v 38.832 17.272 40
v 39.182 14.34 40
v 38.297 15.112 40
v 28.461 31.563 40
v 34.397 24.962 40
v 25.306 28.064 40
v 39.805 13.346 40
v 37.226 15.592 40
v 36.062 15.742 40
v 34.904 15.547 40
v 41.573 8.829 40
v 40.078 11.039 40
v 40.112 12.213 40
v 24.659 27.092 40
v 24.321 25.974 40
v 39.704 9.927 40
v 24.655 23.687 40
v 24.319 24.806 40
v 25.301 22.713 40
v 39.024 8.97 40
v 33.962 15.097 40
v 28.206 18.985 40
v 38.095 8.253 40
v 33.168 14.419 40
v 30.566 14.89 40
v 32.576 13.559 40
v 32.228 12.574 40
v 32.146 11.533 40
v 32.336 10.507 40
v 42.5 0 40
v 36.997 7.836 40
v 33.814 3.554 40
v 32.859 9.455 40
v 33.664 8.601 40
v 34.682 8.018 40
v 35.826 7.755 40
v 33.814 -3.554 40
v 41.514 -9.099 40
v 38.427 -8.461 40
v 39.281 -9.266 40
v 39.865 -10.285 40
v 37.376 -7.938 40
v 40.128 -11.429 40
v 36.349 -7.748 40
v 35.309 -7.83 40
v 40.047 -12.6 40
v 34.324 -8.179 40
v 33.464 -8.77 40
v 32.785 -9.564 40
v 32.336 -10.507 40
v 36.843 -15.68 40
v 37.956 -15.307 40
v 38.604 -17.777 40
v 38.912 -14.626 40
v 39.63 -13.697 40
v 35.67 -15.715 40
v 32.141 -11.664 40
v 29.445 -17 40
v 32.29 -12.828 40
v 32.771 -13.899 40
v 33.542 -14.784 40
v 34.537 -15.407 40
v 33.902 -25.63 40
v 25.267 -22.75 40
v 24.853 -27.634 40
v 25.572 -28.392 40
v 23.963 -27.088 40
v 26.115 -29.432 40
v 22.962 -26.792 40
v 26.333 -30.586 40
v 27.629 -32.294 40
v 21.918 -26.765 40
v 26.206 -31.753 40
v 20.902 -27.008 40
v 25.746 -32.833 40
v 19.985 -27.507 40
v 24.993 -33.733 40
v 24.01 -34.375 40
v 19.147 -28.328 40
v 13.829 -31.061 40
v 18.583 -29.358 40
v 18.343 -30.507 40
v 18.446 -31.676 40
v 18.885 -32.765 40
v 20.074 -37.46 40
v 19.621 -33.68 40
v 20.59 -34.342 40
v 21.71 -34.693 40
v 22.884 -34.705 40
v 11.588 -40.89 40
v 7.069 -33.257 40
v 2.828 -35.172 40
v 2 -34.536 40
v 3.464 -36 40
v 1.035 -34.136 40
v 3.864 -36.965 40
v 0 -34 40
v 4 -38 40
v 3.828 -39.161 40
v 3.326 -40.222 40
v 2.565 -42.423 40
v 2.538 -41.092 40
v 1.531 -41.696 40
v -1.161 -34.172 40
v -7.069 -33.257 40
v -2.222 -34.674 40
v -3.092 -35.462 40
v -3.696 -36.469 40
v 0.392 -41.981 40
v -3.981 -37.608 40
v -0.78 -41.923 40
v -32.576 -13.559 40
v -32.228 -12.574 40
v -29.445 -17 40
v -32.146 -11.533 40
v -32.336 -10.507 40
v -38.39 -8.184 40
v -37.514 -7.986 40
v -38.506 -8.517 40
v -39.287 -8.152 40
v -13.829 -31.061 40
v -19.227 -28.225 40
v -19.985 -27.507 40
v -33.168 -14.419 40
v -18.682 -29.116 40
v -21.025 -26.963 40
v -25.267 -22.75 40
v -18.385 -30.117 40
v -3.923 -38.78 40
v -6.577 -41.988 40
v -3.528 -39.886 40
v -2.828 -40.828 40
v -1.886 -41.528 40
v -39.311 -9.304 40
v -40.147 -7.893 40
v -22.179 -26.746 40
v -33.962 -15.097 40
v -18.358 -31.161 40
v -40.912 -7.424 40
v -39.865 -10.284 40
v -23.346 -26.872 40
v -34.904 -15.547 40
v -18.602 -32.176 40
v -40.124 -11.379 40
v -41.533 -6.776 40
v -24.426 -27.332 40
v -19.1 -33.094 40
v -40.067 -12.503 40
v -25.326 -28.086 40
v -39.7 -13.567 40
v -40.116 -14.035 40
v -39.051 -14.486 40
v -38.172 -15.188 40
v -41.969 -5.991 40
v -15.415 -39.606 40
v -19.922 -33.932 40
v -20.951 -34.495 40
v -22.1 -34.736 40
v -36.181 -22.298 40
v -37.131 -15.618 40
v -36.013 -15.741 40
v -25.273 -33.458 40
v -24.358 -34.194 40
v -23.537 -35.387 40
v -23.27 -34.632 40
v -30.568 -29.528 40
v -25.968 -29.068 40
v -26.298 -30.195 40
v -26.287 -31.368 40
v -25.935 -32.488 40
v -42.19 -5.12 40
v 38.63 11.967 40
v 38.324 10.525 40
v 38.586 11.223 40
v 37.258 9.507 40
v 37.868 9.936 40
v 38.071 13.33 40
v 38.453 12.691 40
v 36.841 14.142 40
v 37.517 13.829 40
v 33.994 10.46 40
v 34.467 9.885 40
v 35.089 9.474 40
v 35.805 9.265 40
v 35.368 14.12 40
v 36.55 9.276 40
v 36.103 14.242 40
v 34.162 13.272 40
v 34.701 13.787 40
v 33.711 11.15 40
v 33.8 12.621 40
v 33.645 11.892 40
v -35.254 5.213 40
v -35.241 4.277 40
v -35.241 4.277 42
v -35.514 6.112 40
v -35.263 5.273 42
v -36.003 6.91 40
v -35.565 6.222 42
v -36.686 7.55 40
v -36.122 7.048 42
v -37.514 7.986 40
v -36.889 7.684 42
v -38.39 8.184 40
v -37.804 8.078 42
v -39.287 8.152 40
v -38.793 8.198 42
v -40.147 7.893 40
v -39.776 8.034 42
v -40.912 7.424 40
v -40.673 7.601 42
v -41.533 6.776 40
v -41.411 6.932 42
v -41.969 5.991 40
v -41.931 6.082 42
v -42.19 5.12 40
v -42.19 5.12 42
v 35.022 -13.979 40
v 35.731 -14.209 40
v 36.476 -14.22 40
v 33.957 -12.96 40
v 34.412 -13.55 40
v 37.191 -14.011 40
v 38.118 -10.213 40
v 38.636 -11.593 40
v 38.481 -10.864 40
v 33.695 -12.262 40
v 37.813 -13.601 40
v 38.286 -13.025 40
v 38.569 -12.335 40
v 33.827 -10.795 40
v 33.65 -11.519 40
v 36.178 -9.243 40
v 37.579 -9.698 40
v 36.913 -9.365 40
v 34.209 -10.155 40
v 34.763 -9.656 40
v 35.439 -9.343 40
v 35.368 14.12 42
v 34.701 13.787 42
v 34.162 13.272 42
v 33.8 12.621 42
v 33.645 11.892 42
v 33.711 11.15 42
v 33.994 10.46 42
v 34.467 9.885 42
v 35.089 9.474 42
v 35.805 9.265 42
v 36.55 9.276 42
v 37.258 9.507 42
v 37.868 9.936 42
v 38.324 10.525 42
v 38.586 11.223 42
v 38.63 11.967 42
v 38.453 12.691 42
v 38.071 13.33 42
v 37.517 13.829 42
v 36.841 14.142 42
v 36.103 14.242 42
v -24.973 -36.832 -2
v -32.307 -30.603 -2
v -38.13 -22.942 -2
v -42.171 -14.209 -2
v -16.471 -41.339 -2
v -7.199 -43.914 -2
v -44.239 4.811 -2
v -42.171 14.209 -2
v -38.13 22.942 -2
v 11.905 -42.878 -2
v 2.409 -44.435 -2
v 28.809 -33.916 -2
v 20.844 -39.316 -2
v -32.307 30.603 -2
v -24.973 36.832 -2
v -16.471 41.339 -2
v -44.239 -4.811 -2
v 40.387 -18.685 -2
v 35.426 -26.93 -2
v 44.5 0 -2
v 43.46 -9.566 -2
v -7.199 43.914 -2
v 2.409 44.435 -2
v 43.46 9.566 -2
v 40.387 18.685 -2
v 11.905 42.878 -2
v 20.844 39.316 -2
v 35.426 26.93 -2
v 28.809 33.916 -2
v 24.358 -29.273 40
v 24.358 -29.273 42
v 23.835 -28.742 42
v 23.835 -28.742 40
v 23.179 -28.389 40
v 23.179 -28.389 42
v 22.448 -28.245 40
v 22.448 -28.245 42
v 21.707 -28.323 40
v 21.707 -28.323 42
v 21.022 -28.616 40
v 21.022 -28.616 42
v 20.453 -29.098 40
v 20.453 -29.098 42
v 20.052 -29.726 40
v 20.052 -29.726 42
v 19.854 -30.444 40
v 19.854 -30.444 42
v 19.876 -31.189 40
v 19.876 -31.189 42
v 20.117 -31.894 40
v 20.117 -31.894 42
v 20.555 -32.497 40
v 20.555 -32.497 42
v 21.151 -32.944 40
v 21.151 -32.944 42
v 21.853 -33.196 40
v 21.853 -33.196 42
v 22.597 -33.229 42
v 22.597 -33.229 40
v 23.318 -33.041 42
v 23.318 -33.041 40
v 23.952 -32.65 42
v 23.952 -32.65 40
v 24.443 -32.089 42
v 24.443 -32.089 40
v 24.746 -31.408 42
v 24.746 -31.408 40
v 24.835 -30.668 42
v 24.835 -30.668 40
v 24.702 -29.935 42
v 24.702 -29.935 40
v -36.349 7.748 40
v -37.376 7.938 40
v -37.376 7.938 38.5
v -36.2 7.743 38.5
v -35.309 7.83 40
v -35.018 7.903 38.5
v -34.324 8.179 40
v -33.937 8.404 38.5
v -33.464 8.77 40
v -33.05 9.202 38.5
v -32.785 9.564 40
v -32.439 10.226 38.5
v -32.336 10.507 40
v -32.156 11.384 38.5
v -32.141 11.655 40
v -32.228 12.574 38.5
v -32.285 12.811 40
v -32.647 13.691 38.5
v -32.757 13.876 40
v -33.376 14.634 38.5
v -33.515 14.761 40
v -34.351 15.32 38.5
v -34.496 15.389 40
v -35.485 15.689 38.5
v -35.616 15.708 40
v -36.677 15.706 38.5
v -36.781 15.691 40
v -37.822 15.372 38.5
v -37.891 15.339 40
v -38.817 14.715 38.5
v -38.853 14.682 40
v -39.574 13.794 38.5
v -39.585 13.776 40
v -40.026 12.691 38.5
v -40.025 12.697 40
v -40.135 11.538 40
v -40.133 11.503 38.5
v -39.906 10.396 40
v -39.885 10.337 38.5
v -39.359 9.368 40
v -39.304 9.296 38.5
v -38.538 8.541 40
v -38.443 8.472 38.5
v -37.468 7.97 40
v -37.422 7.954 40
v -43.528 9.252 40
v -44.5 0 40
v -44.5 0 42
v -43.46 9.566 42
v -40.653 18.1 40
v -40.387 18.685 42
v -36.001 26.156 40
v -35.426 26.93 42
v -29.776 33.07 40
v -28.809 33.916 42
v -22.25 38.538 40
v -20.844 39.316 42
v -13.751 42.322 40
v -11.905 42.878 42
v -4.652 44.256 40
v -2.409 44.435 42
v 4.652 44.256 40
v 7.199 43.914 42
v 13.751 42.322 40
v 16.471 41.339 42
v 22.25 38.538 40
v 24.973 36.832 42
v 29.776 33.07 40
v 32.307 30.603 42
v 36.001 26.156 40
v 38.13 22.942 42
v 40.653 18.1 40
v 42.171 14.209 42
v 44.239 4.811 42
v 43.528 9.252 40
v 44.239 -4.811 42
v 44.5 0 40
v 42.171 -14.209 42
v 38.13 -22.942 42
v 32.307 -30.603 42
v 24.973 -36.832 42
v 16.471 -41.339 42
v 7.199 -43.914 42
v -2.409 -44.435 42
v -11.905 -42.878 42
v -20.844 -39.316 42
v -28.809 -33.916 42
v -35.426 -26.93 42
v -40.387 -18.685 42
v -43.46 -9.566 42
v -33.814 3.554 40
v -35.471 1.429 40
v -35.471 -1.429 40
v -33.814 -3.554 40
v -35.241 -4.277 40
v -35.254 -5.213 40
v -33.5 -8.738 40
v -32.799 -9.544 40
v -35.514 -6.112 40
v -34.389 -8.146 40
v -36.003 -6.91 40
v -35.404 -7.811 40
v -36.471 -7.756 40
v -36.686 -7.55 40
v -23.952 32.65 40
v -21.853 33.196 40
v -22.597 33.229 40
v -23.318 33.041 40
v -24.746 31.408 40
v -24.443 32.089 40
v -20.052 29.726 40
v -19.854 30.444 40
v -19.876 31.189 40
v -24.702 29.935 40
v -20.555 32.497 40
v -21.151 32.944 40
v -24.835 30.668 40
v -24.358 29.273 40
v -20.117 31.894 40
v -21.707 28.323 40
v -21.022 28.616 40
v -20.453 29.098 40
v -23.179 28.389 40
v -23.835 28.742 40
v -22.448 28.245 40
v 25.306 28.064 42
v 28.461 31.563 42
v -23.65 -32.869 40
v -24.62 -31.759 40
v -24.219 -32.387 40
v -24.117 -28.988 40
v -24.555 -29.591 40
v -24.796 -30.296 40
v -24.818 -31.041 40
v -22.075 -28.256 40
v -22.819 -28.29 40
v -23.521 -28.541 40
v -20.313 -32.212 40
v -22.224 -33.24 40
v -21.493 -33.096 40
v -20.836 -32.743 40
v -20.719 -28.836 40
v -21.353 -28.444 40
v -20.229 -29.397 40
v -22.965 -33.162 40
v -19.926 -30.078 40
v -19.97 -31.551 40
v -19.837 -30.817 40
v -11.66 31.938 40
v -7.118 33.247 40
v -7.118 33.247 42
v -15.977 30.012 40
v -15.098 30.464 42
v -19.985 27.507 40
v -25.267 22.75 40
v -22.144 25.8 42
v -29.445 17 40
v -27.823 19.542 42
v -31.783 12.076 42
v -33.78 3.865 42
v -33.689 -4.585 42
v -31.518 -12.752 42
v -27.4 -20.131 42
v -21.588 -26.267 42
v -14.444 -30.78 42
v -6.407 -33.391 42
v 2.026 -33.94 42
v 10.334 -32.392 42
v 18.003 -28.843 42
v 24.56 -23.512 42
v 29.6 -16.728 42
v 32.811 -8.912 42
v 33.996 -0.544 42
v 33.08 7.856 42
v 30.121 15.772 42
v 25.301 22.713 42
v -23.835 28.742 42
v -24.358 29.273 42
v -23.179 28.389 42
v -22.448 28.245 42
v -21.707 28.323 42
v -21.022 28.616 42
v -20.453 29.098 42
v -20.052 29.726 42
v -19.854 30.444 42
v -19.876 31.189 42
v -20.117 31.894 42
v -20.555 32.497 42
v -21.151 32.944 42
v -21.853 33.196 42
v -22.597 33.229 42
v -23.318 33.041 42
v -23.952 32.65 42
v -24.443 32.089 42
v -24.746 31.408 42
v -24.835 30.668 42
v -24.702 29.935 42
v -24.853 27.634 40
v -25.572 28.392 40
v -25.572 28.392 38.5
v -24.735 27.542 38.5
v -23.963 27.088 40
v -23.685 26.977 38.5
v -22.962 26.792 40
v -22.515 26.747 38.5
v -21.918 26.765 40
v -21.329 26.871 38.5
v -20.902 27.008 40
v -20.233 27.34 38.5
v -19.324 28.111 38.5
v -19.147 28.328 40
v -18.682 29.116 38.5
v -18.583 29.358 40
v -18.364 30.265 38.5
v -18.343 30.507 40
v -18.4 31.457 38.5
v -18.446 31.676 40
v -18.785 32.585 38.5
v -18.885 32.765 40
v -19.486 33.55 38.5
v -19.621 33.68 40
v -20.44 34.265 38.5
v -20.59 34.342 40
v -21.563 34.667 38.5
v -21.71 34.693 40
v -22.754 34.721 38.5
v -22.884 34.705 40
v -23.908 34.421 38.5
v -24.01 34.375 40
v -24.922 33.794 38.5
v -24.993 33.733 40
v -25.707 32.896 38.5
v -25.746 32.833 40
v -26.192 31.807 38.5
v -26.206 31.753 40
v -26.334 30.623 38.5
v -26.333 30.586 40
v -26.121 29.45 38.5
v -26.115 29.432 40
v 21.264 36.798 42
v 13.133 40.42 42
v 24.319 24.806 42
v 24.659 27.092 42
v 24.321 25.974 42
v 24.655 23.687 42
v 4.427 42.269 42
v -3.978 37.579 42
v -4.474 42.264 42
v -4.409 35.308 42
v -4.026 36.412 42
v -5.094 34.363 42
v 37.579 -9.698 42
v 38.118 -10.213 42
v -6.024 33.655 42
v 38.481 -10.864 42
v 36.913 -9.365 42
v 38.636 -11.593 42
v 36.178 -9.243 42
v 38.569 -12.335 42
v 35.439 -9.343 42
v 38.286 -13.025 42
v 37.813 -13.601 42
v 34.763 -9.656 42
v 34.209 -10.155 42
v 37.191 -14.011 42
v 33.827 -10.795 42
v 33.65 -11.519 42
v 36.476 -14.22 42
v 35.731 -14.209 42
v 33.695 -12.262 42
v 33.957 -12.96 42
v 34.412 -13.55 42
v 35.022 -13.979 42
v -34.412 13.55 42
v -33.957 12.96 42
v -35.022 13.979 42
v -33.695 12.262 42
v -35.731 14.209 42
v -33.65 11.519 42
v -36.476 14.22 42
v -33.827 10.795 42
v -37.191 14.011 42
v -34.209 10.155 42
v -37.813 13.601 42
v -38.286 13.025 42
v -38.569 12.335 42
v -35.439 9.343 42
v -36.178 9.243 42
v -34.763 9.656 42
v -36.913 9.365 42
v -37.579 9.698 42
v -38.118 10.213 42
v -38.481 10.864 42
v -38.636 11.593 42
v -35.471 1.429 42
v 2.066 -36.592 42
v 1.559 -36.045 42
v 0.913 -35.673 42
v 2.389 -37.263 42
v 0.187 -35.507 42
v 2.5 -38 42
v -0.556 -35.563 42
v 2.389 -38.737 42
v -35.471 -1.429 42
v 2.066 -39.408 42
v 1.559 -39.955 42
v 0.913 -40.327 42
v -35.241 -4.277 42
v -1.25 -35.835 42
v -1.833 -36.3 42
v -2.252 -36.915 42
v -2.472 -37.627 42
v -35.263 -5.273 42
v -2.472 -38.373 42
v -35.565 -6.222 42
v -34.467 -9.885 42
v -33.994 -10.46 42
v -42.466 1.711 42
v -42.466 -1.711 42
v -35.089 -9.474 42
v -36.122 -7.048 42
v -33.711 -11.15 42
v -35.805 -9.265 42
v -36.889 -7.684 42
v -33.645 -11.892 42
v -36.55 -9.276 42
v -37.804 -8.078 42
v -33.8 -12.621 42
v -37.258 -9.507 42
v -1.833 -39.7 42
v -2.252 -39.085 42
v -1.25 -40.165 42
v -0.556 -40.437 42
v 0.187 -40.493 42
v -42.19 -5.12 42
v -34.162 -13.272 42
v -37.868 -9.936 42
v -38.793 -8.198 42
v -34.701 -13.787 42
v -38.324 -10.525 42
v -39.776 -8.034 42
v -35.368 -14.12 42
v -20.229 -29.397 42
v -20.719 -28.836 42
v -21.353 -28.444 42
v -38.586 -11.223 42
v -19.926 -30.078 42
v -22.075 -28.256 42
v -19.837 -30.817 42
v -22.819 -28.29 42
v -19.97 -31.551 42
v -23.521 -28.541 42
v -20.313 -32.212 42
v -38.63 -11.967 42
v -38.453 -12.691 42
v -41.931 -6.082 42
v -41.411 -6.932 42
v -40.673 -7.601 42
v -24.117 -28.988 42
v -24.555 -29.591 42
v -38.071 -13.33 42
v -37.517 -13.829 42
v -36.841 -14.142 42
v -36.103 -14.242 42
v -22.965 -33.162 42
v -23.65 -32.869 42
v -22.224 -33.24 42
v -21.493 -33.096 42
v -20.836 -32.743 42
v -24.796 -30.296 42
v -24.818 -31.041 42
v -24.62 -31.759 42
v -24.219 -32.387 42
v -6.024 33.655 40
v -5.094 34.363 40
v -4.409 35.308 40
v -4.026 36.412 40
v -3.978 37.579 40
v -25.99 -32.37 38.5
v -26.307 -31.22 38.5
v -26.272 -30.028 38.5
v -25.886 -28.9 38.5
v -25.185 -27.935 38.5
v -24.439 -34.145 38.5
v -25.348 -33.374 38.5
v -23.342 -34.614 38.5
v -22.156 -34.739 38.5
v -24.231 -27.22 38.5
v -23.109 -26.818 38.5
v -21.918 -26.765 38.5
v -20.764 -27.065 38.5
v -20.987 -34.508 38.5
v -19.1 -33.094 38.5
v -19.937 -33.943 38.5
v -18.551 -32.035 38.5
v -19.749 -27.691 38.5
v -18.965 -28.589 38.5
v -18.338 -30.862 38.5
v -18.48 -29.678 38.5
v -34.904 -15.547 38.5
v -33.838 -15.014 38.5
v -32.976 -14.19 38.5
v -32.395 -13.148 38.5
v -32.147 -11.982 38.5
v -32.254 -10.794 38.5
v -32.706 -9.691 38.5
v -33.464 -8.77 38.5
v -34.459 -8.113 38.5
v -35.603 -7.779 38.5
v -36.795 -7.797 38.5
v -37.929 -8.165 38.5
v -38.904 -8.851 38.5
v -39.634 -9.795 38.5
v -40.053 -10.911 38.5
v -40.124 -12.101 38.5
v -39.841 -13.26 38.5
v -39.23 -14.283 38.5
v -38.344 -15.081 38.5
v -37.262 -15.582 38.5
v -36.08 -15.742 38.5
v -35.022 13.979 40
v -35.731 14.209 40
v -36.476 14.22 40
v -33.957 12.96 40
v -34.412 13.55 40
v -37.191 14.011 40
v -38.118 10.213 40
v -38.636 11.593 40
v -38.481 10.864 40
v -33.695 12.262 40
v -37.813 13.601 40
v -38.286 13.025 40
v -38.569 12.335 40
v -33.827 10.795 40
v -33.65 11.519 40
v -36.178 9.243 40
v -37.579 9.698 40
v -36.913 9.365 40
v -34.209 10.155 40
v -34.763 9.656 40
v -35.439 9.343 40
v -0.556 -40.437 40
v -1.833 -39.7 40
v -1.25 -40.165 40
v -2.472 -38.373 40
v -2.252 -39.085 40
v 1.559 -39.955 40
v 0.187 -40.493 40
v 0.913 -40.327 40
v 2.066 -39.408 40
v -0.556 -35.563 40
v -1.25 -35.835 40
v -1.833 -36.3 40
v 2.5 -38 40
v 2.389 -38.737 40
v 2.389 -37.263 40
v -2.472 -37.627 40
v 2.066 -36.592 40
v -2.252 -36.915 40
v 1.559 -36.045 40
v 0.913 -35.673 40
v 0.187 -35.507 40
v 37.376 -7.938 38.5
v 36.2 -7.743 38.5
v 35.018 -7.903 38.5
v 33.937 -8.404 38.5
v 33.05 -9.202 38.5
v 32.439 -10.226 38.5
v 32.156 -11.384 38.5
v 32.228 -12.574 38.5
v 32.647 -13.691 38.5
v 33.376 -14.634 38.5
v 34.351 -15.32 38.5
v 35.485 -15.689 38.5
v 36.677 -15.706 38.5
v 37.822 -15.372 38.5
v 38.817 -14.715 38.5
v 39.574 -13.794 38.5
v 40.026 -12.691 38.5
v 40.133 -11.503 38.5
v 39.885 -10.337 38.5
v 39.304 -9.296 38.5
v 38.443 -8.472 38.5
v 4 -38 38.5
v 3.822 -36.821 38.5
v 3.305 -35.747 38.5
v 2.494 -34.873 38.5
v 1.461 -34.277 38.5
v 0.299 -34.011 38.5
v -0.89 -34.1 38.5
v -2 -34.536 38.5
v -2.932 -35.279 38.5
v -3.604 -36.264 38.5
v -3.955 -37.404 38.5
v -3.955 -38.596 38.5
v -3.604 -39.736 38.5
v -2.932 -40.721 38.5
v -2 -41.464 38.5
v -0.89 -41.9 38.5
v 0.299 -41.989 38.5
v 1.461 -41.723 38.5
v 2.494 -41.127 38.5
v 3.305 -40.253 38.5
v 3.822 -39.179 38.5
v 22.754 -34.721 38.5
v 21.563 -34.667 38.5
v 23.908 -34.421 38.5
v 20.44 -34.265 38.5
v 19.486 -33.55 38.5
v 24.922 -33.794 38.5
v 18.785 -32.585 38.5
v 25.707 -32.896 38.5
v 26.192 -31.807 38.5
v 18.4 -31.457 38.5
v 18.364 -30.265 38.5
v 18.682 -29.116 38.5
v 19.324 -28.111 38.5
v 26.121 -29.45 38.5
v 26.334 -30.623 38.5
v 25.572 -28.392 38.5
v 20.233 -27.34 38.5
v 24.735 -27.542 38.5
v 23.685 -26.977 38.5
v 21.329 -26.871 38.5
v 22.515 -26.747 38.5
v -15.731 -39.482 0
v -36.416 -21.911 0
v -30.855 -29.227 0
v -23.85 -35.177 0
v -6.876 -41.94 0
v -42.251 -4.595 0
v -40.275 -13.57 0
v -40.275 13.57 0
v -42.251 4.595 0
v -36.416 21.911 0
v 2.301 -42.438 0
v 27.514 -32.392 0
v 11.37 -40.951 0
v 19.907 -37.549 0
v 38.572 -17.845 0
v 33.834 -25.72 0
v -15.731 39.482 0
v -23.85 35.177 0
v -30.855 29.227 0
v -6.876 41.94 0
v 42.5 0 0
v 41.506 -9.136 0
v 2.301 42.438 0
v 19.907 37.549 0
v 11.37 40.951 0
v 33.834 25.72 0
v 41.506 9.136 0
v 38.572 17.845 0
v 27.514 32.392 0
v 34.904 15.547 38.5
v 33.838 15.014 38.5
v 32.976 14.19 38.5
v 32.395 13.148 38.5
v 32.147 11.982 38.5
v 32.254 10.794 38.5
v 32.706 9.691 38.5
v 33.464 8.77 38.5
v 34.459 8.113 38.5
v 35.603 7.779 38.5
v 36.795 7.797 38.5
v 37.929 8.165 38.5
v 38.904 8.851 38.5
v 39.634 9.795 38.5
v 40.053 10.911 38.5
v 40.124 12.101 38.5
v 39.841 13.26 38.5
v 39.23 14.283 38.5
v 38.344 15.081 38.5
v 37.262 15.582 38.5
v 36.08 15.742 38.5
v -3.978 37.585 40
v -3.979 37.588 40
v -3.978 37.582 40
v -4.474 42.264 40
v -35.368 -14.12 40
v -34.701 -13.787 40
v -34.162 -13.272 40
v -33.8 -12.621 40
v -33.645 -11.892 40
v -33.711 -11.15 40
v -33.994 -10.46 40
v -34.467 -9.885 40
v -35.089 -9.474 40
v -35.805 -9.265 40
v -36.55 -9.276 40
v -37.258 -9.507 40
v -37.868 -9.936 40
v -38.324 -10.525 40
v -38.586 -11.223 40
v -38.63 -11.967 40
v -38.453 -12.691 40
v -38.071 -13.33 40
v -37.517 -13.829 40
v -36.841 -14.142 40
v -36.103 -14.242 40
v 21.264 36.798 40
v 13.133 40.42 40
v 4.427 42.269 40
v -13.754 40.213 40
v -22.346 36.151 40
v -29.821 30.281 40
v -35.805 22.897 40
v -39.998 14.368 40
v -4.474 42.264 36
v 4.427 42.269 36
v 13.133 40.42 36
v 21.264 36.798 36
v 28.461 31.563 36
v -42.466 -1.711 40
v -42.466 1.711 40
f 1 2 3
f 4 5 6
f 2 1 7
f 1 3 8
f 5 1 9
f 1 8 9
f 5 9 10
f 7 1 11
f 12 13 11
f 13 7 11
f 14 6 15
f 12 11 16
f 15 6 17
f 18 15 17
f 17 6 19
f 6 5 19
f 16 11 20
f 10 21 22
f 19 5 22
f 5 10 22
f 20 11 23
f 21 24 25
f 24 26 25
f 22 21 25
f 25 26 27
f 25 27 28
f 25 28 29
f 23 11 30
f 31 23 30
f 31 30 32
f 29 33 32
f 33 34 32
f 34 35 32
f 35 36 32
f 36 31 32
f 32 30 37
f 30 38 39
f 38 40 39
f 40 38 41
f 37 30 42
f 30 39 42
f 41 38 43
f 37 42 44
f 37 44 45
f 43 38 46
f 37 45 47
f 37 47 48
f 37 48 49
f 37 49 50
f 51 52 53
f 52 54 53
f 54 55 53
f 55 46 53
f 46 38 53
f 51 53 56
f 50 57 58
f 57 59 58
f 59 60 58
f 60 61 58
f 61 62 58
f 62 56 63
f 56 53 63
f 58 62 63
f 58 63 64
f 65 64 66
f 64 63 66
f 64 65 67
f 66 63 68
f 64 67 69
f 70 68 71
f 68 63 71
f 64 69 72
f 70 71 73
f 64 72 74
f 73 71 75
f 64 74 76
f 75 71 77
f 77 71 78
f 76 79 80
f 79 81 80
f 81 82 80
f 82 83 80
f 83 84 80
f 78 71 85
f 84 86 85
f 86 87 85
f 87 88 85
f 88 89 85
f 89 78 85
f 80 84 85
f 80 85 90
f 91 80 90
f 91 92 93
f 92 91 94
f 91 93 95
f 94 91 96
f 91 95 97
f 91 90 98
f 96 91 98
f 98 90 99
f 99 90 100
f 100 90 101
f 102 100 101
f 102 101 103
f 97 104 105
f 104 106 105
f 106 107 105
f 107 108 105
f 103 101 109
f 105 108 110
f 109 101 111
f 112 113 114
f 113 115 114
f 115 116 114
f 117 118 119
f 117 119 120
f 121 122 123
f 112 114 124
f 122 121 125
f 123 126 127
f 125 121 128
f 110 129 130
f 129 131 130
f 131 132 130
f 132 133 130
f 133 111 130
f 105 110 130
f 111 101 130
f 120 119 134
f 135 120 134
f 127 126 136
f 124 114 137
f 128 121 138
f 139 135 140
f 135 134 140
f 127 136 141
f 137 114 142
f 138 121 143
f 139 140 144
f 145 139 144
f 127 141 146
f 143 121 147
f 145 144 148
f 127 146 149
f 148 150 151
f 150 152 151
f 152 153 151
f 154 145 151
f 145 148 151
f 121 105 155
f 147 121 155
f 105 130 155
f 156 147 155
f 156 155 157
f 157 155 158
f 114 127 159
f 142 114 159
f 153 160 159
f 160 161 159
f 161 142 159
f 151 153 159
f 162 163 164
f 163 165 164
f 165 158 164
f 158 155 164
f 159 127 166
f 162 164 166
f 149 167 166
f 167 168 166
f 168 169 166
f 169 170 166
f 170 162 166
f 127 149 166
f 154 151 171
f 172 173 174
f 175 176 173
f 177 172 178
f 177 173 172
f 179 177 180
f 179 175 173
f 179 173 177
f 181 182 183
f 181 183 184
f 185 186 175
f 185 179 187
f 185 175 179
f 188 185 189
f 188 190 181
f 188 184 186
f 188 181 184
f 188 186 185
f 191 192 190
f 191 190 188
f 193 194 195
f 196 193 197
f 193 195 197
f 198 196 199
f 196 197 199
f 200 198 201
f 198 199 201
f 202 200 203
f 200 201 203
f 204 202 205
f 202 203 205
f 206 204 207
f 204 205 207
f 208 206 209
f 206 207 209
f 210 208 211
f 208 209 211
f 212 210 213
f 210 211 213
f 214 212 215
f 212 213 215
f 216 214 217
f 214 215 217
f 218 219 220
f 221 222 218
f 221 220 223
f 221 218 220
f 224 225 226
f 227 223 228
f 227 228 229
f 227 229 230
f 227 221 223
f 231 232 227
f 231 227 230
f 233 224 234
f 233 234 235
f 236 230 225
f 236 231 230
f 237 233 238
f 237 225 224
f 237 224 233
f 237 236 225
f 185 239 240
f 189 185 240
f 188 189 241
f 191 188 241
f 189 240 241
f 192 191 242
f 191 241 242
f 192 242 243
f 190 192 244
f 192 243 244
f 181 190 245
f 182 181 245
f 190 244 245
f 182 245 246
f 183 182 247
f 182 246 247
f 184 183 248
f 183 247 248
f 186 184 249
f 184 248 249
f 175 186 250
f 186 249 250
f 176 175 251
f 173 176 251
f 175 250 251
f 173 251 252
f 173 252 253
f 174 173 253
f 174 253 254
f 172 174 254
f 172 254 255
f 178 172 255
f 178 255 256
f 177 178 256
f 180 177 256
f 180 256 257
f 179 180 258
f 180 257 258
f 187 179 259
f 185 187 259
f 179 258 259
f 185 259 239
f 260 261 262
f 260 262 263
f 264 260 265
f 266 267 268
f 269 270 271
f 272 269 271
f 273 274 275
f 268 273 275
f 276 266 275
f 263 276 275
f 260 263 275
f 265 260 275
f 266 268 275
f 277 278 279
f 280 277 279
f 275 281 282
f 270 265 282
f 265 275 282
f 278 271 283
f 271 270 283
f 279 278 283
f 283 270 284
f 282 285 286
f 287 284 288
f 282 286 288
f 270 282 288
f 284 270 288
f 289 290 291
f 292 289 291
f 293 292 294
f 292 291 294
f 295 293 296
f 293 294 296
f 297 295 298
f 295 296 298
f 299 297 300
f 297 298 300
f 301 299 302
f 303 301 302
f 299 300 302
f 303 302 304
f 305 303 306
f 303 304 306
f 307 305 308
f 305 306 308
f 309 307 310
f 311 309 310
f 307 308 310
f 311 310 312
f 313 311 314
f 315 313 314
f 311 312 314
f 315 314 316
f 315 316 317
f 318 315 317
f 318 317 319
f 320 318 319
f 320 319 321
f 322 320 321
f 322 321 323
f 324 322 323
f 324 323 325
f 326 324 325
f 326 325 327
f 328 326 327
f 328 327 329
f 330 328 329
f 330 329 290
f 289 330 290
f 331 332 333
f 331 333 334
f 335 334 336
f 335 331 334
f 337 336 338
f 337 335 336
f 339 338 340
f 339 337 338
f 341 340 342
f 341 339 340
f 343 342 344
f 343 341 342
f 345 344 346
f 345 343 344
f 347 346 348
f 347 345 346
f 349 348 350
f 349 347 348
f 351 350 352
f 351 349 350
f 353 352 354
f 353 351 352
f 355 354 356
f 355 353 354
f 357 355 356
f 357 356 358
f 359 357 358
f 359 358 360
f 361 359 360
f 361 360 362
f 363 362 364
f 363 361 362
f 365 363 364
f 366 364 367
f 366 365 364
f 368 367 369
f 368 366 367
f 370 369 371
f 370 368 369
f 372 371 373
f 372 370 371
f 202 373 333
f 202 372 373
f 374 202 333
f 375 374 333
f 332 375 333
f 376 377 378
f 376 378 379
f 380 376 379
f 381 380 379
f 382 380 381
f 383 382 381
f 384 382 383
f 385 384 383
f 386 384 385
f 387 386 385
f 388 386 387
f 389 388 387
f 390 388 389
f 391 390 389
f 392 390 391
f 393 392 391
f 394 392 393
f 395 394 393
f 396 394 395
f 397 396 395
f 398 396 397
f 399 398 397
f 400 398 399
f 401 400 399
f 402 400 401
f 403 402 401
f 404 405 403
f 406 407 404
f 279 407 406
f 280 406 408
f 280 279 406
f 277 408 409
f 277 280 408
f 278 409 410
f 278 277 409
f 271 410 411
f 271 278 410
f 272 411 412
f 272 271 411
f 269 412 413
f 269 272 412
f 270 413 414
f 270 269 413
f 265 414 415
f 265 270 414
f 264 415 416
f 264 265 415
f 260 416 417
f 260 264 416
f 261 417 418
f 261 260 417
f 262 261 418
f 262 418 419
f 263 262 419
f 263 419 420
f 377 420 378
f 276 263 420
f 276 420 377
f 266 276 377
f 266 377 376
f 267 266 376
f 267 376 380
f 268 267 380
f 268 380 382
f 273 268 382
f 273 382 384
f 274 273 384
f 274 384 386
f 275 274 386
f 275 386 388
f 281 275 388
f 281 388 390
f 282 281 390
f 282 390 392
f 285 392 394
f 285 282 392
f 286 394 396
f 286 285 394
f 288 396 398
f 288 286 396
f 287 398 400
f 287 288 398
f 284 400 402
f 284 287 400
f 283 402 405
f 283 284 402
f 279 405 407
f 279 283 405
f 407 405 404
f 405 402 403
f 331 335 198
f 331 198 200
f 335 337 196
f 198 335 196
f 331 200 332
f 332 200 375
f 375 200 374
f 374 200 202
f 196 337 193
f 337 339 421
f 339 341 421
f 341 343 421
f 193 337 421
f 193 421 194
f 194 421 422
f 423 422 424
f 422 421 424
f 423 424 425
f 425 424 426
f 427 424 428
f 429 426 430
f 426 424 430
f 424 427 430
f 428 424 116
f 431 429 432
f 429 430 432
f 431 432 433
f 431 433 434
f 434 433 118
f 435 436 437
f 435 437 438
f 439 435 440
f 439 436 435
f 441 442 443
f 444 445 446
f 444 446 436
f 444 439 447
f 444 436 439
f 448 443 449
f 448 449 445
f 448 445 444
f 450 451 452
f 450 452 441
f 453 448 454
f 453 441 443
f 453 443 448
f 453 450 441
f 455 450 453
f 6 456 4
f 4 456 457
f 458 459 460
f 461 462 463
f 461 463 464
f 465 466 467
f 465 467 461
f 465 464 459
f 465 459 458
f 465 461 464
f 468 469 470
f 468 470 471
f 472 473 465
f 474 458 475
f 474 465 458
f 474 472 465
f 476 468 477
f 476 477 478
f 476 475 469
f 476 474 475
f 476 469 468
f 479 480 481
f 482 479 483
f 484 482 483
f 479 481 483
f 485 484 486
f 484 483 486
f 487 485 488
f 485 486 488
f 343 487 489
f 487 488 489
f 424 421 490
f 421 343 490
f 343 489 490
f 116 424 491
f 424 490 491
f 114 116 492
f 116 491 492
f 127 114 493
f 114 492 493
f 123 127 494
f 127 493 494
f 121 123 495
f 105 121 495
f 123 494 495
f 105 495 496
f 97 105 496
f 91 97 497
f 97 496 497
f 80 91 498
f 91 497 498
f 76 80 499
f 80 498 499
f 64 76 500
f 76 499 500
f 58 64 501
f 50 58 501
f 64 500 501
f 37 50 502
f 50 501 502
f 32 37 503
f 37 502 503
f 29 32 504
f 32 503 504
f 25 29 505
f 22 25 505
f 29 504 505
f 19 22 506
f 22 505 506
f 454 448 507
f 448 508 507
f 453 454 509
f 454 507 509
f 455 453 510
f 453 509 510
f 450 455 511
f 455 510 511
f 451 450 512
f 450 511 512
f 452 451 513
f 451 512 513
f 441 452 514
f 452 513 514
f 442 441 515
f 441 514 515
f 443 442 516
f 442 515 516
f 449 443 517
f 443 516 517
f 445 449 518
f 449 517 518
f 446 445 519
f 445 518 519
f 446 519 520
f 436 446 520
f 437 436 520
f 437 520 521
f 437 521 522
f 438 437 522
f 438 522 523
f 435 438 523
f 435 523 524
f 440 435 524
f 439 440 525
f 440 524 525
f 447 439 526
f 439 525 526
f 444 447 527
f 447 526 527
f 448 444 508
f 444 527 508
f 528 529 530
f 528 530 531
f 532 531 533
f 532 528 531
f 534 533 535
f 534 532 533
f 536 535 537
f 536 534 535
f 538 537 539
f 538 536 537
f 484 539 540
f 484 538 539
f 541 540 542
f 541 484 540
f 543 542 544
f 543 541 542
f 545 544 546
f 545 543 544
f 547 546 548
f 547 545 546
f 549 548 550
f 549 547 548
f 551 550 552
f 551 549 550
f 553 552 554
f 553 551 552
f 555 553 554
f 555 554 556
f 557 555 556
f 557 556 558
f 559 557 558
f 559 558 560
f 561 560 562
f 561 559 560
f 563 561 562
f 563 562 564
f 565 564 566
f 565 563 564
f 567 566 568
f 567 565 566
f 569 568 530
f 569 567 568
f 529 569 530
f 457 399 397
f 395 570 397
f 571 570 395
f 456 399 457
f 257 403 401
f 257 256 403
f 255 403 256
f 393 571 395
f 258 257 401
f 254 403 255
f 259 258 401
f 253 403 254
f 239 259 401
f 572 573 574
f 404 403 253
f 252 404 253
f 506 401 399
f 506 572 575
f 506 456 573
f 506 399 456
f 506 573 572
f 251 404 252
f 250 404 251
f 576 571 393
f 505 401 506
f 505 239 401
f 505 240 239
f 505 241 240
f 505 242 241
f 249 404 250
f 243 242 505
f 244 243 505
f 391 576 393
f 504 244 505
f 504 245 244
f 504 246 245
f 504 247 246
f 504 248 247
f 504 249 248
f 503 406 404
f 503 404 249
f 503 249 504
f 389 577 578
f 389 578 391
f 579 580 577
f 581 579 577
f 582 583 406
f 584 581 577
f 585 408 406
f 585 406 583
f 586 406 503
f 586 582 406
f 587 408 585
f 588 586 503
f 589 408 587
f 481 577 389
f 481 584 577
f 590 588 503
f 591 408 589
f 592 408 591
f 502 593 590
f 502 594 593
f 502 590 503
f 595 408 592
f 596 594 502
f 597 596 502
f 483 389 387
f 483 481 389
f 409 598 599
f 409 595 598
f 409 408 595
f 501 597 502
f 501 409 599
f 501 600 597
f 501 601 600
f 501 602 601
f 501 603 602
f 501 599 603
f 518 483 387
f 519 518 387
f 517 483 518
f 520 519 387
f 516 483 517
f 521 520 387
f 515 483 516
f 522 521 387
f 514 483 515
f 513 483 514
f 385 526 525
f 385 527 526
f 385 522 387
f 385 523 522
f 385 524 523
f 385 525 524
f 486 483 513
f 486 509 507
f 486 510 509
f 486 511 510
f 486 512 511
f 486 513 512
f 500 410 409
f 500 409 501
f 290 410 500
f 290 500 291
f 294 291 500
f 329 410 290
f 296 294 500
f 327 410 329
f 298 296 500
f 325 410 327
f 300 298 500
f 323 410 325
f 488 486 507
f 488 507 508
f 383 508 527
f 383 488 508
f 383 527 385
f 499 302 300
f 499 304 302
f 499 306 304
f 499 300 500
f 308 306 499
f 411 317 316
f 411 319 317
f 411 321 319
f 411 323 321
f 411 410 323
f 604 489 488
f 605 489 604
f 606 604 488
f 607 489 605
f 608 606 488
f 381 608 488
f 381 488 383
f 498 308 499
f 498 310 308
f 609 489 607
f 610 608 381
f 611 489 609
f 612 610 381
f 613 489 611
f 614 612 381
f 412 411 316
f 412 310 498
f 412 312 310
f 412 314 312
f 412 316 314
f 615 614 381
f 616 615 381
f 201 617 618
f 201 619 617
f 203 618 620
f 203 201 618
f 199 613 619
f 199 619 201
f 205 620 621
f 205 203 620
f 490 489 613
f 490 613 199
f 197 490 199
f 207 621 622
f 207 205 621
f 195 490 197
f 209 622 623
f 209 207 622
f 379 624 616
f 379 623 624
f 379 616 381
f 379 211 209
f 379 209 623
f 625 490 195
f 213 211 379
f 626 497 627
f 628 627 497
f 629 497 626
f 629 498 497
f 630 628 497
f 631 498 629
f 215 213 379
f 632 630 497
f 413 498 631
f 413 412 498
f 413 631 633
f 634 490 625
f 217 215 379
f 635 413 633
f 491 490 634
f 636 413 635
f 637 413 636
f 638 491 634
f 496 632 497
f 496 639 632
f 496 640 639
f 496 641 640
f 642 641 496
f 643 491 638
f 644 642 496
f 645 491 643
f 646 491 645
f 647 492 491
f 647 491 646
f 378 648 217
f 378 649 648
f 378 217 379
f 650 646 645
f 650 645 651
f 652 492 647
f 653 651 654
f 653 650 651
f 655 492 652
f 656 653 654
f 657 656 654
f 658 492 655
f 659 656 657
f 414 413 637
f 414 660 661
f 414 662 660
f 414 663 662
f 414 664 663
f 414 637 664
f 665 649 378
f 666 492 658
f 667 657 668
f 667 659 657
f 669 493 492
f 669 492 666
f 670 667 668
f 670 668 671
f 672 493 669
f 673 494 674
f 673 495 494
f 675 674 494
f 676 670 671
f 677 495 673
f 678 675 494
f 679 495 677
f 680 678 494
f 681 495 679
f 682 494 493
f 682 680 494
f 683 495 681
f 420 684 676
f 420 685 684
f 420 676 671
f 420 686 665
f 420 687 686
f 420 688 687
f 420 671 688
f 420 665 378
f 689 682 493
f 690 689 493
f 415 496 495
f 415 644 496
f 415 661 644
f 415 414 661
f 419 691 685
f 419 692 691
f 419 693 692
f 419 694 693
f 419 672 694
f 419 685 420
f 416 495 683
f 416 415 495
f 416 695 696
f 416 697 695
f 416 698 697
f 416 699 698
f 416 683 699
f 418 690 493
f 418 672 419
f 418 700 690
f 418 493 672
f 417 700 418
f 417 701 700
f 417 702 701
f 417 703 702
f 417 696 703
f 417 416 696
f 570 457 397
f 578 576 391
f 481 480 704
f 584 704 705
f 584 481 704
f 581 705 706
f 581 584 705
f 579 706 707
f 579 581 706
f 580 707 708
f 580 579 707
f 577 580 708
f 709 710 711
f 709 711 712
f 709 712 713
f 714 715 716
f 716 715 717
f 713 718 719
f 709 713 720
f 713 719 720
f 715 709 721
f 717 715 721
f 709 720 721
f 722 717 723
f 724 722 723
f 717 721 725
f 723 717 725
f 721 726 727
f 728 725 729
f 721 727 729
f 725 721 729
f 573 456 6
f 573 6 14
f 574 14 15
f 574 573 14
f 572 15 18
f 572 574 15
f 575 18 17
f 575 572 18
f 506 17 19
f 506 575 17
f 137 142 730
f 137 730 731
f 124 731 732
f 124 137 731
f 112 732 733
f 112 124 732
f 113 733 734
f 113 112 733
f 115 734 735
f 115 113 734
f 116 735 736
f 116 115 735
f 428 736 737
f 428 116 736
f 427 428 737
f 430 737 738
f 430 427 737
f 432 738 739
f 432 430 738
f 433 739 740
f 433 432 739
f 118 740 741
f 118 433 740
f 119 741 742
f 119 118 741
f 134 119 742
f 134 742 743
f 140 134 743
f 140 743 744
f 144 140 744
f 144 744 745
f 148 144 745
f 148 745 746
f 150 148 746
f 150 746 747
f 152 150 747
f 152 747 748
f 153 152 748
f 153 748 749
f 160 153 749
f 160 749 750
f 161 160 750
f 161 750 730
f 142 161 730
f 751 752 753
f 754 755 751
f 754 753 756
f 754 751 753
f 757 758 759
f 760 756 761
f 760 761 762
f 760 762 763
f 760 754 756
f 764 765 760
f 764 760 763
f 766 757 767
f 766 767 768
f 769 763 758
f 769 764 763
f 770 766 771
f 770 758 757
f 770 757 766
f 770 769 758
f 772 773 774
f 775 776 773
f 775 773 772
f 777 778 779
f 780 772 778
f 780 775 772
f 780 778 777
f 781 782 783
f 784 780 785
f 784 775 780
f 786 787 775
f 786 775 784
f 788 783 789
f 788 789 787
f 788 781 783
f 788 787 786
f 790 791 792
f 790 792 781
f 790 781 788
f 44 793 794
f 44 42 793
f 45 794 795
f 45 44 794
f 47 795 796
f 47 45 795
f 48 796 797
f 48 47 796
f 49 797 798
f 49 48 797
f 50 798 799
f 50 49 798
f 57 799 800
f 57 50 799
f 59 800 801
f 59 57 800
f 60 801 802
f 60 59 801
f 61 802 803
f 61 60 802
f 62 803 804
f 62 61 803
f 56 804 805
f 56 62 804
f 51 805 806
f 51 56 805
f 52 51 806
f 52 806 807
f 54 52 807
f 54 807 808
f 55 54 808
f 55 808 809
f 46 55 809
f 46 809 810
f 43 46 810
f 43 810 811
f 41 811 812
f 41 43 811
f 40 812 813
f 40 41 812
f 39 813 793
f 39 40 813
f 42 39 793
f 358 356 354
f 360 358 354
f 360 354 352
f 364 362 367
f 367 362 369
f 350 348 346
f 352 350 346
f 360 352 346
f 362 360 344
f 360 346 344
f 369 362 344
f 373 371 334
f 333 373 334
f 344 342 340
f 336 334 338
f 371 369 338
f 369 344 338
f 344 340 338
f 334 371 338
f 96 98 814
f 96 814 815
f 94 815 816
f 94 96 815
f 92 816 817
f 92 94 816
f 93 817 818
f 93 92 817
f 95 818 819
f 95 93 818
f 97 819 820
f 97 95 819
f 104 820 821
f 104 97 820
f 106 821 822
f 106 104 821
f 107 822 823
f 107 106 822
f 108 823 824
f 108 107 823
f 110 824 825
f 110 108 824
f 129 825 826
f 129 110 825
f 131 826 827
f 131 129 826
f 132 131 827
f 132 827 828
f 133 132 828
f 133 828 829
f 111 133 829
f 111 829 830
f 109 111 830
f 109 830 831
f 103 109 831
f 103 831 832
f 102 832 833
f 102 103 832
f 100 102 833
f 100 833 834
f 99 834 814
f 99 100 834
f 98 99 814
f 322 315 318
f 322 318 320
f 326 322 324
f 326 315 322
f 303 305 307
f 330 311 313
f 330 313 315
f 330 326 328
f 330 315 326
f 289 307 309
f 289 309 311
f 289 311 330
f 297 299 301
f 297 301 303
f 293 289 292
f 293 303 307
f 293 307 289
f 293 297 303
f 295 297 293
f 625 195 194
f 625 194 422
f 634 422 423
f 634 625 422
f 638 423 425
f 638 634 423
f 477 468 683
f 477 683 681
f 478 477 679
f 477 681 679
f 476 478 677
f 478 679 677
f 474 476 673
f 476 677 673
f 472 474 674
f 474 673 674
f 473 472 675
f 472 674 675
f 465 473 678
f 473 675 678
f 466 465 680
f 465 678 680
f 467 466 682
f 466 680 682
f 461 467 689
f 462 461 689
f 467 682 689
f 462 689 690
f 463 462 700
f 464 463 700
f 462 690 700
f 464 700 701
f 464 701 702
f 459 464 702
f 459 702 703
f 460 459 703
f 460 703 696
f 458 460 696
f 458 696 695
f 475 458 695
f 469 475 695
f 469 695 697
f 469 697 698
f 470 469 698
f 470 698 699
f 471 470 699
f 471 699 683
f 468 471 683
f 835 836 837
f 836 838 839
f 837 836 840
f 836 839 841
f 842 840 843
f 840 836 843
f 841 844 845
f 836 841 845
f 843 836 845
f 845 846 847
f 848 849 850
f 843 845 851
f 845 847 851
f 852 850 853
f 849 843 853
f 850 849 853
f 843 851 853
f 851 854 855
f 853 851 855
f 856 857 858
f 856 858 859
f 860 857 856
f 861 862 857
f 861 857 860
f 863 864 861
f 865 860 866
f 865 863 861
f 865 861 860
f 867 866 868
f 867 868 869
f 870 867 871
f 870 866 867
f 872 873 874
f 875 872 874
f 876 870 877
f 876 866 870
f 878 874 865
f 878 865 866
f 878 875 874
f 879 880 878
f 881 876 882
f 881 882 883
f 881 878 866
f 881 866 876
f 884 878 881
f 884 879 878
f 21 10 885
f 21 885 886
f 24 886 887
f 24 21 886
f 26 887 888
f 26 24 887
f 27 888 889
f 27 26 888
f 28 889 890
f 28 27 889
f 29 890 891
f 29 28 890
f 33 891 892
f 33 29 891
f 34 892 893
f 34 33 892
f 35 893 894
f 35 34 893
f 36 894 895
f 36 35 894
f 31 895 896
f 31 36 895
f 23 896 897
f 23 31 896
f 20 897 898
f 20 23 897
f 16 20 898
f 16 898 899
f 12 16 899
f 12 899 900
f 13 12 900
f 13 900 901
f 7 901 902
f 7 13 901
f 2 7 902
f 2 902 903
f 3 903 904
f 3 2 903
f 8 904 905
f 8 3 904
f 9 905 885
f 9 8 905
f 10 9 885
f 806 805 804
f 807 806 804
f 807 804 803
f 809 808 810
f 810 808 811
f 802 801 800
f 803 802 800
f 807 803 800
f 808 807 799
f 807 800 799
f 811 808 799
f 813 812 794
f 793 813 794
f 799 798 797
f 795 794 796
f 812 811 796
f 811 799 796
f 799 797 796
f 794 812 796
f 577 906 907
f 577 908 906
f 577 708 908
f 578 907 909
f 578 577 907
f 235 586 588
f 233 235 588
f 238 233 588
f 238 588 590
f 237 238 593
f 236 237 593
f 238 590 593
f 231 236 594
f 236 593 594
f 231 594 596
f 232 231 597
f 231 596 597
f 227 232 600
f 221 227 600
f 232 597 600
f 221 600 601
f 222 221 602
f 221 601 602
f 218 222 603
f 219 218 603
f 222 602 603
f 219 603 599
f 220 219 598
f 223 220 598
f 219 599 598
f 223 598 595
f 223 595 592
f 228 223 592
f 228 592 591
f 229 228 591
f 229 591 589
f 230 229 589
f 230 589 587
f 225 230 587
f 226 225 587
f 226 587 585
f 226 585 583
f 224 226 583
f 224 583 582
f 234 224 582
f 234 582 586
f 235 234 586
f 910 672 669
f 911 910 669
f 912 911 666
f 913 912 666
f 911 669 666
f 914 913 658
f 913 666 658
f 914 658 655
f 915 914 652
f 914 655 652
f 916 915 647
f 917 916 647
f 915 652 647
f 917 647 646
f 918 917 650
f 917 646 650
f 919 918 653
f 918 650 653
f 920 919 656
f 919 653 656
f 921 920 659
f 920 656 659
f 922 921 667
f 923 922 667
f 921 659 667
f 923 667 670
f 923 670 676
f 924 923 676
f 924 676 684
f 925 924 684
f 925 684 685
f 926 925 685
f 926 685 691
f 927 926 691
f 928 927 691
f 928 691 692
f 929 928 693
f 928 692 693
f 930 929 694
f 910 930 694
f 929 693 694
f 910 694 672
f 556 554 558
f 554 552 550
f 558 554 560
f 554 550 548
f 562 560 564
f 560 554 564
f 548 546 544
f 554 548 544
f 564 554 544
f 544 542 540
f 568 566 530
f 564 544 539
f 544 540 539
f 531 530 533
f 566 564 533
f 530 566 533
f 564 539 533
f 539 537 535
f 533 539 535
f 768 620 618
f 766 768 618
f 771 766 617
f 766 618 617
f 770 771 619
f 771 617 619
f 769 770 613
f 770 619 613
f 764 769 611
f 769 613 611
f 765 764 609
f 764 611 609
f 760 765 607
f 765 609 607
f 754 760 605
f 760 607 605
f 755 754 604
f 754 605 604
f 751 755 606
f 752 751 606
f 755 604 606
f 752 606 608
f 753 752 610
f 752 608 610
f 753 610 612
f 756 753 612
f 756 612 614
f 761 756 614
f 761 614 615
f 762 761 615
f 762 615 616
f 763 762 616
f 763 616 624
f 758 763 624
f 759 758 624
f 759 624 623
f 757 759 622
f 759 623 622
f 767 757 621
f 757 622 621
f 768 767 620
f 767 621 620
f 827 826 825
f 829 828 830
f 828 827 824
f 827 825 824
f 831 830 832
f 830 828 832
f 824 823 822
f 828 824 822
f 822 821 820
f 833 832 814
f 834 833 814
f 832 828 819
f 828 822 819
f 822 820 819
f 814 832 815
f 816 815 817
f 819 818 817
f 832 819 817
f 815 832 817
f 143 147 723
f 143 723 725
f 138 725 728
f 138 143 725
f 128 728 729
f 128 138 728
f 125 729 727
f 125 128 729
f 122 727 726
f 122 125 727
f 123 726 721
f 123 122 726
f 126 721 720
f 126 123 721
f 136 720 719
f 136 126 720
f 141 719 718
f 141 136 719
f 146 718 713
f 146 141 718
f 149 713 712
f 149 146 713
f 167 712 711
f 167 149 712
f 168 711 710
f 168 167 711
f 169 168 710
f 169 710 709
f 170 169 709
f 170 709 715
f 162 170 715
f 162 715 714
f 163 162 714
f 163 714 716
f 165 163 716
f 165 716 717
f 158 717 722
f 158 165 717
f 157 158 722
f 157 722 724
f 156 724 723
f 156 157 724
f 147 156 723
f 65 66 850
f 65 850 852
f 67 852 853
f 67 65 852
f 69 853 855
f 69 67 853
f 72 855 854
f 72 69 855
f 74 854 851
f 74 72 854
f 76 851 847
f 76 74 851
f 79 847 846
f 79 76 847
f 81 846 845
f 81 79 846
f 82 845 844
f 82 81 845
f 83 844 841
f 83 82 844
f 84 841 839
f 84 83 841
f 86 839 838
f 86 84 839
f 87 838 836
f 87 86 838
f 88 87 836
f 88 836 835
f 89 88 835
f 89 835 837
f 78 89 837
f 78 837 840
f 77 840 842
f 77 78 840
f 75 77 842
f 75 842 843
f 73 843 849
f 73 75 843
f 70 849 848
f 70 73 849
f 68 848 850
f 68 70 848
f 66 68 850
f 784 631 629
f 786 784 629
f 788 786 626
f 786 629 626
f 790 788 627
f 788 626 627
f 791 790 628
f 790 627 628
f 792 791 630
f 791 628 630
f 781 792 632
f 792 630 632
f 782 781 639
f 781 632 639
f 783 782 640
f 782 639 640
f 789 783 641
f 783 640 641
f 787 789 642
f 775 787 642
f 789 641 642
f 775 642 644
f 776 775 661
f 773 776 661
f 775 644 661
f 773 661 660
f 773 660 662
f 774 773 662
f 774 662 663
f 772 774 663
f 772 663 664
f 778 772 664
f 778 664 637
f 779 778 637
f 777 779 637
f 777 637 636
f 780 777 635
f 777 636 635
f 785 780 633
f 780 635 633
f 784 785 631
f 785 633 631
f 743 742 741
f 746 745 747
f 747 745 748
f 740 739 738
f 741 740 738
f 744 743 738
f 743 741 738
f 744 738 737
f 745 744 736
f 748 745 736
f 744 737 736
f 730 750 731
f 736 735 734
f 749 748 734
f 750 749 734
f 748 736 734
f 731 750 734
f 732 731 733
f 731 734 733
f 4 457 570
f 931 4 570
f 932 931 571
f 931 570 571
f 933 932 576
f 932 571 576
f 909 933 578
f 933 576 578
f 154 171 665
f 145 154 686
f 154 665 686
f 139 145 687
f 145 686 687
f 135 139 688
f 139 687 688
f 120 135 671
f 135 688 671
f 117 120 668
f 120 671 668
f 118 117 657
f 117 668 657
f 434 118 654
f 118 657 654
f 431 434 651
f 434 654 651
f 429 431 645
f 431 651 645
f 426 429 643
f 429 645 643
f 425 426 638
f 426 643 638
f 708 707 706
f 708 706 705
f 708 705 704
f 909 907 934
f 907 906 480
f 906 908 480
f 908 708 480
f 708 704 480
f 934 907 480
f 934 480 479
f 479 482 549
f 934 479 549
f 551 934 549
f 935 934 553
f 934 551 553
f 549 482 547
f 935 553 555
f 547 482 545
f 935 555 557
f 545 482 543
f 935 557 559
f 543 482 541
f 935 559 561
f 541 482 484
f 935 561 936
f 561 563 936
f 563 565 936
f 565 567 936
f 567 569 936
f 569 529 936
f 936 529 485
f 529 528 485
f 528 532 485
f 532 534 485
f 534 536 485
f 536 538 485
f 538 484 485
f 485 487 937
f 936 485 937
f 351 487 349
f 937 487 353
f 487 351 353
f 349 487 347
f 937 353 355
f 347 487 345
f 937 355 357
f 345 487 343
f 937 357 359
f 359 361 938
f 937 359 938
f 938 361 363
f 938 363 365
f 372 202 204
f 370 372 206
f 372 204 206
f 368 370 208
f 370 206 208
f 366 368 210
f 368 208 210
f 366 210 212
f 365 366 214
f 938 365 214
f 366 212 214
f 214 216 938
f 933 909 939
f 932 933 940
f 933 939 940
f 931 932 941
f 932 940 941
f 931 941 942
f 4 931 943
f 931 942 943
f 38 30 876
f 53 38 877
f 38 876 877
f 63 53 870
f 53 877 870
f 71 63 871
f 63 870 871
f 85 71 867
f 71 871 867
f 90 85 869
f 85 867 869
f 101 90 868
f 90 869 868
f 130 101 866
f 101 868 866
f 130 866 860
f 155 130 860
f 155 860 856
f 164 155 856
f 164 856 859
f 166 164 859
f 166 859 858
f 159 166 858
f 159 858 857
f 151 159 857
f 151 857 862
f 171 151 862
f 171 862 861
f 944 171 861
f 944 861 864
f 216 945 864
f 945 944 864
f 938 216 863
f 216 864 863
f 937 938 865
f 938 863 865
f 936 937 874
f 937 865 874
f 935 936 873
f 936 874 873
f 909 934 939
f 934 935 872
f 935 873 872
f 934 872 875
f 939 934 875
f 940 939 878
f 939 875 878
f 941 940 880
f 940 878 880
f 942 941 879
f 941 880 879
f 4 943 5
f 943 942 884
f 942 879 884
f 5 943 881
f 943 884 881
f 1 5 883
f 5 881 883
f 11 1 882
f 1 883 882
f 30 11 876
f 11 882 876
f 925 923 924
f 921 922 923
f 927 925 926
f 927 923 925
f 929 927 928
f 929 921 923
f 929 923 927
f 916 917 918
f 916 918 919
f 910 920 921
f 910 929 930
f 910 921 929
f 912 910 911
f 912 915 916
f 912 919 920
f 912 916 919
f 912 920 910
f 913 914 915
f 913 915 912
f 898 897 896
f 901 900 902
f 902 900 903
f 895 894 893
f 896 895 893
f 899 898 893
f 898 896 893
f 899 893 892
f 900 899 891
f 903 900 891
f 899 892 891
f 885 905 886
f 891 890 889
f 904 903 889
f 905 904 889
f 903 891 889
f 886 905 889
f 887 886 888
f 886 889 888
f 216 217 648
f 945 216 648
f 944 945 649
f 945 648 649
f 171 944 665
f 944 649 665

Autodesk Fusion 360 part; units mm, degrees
sketch "Sketch1" plane through (0, 0, 0) normal (0, 0, 1) x (1, 0, 0)
  circle A0 centre (0, 0) radius 44.5
  circle A1 centre (0, 0) radius 42.5
  dimension "d1" = 89
  dimension "d2" = 2
extrude "Extrude1" add sketch "Sketch1" against normal blind 2 contours A0 | A1 makes body 1
extrude "Extrude2" add sketch "Sketch1" along normal blind 40 bodies 1
sketch "Sketch2" plane through (0, 0, 40) normal (0, 0, 1) x (-1, 0, 0)
  circle A0 centre (0, 0) radius 42.5
  circle A1 centre (0, 0) radius 44.5
  circle A2 centre (0, 0) radius 44.5
  dimension "d7" = 89
extrude "Extrude3" add sketch "Sketch2" along normal blind 2 separate body contours A0 | A1 A2 makes body 2
sketch "Sketch3" plane through (0, 0, 42) normal (0, 0, 1) x (-1, 0, 0)
  circle A0 centre (0, 0) radius 44.5
  circle A1 centre (0, -38) radius 2.5
  circle A2 centre (0, -38) radius 4
  dimension "d10" = 5
  dimension "d12" = 1.5
  dimension "d24" = 38
extrude "Extrude4" add sketch "Sketch3" against normal blind 3.5 contours A1 | A2 bodies 2
extrude "Extrude5" cut sketch "Sketch3" against normal blind 2 contours A1 bodies 2
pattern_circular "C-Pattern1" count 10 over 360 about axis through (0, 0, 1.75) along (0, 0, 1) of "Extrude4", "Extrude5"
sketch "Sketch5" plane through (0, 0, 42) normal (0, 0, 1) x (-1, 0, 0)
  circle A0 centre (0, 38) radius 2.5
  circle A1 centre (22.3358, 30.7426) radius 2.5
  circle A2 centre (36.1401, 11.7426) radius 2.5
  circle A3 centre (36.1401, -11.7426) radius 2.5
  circle A4 centre (22.3358, -30.7426) radius 2.5
  circle A5 centre (0, -38) radius 2.5
  circle A6 centre (0, 0) radius 44.5
  circle A7 centre (0, 0) radius 34
  circle A8 centre (0, -38) radius 4
  circle A9 centre (-36.1401, -11.7426) radius 2.5
  circle A10 centre (-36.1401, 11.7426) radius 2.5
  circle A11 centre (-22.3358, 30.7426) radius 2.5
  circle A12 centre (-22.3358, -30.7426) radius 2.5
extrude "Extrude6" cut sketch "Sketch5" against normal blind 5 contours A7 bodies 2
sketch "Sketch7" plane through (0, 0, 42) normal (0, 0, 1) x (-1, 0, 0)
  circle A0 centre (0, 0) radius 34
  circle A1 centre (0, 38) radius 2.5
  circle A2 centre (22.3358, 30.7426) radius 2.5
  circle A3 centre (36.1401, 11.7426) radius 2.5
  circle A4 centre (36.1401, -11.7426) radius 2.5
  circle A5 centre (22.3358, -30.7426) radius 2.5
  circle A6 centre (0, -38) radius 2.5
  circle A7 centre (0, 0) radius 44.5
  arc A8 (42.1904, -5.1205) -> (42.1904, 5.1205) centre (0, 0) ccw
  arc A9 (35.2414, -4.2771) -> (42.1904, -5.1205) centre (38.7159, -4.6988) ccw
  arc A10 (35.2414, -4.2771) -> (35.2414, 4.2771) centre (0, 0) ccw
  arc A11 (42.1904, 5.1205) -> (35.2414, 4.2771) centre (38.7159, 4.6988) ccw
  arc A12 (38.7159, -4.6988) -> (38.7159, 4.6988) centre (0, 0) ccw construction
  circle A13 centre (-36.1401, -11.7426) radius 2.5
  circle A14 centre (-36.1401, 11.7426) radius 2.5
  circle A15 centre (-22.3358, 30.7426) radius 2.5
  circle A16 centre (-22.3358, -30.7426) radius 2.5
  circle A17 centre (36.1401, -11.7426) radius 4
  circle A18 centre (36.1401, 11.7426) radius 4
  dimension "d25" = 2
  dimension "d26" = 39
extrude "Extrude7" cut sketch "Sketch7" against normal blind 5 contours A8 A9 A10 A11 bodies 2
combine "Combine1" operation add target body 1 tool bodies 2
sketch "Sketch9" plane through (0, 0, 42) normal (0, 0, 1) x (-1, 0, 0)
  circle A0 centre (0, 0) radius 44.5 construction
  line L0 (0, 0) -> (4.6842, -44.2528)
  line L1 (0, 0) -> (-29.8007, -33.0479)
  circle A1 centre (0, 0) radius 34 construction
  circle A2 centre (0, 0) radius 42.5
  circle A3 centre (22.3358, 30.7426) radius 4
  circle A4 centre (0, 38) radius 4
extrude "Extrude8" cut sketch "Sketch9" against normal blind 6 contours L0 L1 A2 picked at (1.0038, -28.2462) bodies 1
fillet "Fillet1" radius 4 2 edges at (-3.5789, 33.8111, 41) (22.7691, 25.2501, 41) on bodies 1
